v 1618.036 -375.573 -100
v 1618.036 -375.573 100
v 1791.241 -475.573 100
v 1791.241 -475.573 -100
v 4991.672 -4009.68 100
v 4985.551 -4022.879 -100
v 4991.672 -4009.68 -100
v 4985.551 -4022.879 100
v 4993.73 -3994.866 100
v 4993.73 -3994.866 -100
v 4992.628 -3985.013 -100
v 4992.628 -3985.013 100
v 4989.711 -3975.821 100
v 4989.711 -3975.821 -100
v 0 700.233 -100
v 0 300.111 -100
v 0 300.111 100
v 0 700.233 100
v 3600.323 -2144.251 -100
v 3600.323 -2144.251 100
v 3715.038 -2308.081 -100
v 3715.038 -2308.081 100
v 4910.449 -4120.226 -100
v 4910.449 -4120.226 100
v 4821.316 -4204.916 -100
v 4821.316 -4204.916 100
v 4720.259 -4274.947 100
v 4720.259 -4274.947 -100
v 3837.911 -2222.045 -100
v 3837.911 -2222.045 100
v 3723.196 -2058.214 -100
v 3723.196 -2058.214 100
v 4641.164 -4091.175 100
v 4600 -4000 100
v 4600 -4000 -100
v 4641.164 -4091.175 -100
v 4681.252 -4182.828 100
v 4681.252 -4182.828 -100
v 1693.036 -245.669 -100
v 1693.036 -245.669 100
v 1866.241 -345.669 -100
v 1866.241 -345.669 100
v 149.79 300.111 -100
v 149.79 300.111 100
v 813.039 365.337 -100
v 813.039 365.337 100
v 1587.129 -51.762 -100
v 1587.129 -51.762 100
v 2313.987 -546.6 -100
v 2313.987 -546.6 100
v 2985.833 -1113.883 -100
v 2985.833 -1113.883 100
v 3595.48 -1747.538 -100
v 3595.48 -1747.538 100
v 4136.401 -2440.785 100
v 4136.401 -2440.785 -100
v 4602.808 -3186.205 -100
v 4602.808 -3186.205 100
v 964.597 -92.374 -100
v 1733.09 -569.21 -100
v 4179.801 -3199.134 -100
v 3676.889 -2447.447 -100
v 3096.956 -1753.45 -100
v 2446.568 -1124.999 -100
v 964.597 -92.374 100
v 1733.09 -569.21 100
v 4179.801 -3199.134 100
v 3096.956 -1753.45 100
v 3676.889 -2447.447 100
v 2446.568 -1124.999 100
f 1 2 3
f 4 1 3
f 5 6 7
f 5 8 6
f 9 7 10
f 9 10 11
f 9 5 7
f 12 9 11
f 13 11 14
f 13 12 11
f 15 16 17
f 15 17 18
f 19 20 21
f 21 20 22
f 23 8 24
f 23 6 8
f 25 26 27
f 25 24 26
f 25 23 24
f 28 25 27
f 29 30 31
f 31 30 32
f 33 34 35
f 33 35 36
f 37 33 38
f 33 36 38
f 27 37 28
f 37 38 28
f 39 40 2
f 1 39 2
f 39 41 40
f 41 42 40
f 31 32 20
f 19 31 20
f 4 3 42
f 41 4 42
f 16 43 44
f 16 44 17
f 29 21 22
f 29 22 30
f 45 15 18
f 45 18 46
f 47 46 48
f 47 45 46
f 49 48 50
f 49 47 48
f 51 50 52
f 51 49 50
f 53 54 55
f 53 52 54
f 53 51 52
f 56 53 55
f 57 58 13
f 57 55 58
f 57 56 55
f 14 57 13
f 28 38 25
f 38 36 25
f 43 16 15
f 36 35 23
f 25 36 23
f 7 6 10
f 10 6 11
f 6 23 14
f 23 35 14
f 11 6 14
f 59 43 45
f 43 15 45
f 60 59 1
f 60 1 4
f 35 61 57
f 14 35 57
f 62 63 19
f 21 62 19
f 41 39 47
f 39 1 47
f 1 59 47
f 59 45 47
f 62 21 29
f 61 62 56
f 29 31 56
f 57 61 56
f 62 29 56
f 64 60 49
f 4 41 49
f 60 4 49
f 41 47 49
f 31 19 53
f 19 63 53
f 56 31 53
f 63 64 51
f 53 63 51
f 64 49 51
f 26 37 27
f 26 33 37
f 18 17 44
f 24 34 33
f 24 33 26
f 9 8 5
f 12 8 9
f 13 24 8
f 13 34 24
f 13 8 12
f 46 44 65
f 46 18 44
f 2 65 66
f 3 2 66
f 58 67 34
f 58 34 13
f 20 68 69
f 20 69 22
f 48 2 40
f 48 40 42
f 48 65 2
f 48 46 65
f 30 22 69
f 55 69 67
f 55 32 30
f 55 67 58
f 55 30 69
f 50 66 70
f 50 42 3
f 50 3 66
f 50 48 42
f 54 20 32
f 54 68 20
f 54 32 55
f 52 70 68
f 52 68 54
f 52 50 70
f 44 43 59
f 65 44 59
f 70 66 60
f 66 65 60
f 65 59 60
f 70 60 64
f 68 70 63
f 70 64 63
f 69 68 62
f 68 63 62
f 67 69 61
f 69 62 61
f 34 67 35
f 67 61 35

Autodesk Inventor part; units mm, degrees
ref_plane "YZ Plane" through (0, 0, 0) normal (1, 0, 0) x (0, 1, 0)
ref_plane "XZ Plane" through (0, 0, 0) normal (0, 1, 0) x (-1, 0, 0)
ref_plane "XY Plane" through (0, 0, 0) normal (0, 0, 1) x (1, 0, 0)
sketch "Sketch2" plane through (0, 0, 0) normal (0, 0, 1) x (1, 0, 0)
  arc A0 (5000, -4000) -> (0, 700.233) centre (-2826.475, -7316.0653) ccw
  arc A1 (4600, -4000) -> (149.7898, 300.1107) centre (-3126.3122, -7543.1766) ccw
  arc A2 (4720.2587, -4274.9468) -> (4600, -4000) centre (-3126.3122, -7543.1766) ccw
  arc A3 (4720.2587, -4274.9468) -> (5000, -4000) centre (4316.4662, -3584.3299) ccw
  line L0 (149.7898, 300.1107) -> (0, 300.1107)
  line L1 (0, 300.1107) -> (0, 700.233)
  point P0 (0, 0)
  point P1 (4000, -4000)
  dimension "d5" = 8500
  dimension "d7" = 8500
  dimension "d8" = 800
extrude "Extrusion1" add sketch "Sketch2" along normal blind 100 and the other way blind 100
fillet "Fillet2" radius 50 2 edges at (5000, -4000, 50) (5000, -4000, -50)
sketch "Sketch4" plane through (0, 0, 100) normal (0, 0, 1) x (1, 0, 0)
  line L0 (1618.036, -375.5729) -> (1791.241, -475.5729)
  line L1 (1791.241, -475.5729) -> (1866.241, -345.6691)
  line L2 (1866.241, -345.6691) -> (1693.036, -245.6691)
  line L3 (1693.036, -245.6691) -> (1618.036, -375.5729)
  line L4 (1618.036, -375.5729) -> (1866.241, -345.6691) construction
  line L5 (1791.241, -475.5729) -> (1693.036, -245.6691) construction
  line L6 (1618.036, -375.5729) -> (1818.036, -375.5729) construction
  line L7 (3600.3227, -2144.2509) -> (3715.038, -2308.0813)
  line L8 (3715.038, -2308.0813) -> (3837.9108, -2222.0448)
  line L9 (3837.9108, -2222.0448) -> (3723.1955, -2058.2144)
  line L10 (3723.1955, -2058.2144) -> (3600.3227, -2144.2509)
  line L11 (3600.3227, -2144.2509) -> (3837.9108, -2222.0448) construction
  line L12 (3715.038, -2308.0813) -> (3723.1955, -2058.2144) construction
  line L13 (3600.3227, -2144.2509) -> (3800.3227, -2144.2509) construction
  point P0 (0, 0)
  point P1 (1742.1385, -360.621)
  point P2 (3719.1168, -2183.1479)
  dimension "d16" = 200
  dimension "d17" = 30
  dimension "d18" = 150
  dimension "d19" = 200
  dimension "d20" = 55
  dimension "d21" = 150
extrude "Extrusion3" cut sketch "Sketch4" against normal through all
properties part number "curve_beam" material "Wood Shake"
